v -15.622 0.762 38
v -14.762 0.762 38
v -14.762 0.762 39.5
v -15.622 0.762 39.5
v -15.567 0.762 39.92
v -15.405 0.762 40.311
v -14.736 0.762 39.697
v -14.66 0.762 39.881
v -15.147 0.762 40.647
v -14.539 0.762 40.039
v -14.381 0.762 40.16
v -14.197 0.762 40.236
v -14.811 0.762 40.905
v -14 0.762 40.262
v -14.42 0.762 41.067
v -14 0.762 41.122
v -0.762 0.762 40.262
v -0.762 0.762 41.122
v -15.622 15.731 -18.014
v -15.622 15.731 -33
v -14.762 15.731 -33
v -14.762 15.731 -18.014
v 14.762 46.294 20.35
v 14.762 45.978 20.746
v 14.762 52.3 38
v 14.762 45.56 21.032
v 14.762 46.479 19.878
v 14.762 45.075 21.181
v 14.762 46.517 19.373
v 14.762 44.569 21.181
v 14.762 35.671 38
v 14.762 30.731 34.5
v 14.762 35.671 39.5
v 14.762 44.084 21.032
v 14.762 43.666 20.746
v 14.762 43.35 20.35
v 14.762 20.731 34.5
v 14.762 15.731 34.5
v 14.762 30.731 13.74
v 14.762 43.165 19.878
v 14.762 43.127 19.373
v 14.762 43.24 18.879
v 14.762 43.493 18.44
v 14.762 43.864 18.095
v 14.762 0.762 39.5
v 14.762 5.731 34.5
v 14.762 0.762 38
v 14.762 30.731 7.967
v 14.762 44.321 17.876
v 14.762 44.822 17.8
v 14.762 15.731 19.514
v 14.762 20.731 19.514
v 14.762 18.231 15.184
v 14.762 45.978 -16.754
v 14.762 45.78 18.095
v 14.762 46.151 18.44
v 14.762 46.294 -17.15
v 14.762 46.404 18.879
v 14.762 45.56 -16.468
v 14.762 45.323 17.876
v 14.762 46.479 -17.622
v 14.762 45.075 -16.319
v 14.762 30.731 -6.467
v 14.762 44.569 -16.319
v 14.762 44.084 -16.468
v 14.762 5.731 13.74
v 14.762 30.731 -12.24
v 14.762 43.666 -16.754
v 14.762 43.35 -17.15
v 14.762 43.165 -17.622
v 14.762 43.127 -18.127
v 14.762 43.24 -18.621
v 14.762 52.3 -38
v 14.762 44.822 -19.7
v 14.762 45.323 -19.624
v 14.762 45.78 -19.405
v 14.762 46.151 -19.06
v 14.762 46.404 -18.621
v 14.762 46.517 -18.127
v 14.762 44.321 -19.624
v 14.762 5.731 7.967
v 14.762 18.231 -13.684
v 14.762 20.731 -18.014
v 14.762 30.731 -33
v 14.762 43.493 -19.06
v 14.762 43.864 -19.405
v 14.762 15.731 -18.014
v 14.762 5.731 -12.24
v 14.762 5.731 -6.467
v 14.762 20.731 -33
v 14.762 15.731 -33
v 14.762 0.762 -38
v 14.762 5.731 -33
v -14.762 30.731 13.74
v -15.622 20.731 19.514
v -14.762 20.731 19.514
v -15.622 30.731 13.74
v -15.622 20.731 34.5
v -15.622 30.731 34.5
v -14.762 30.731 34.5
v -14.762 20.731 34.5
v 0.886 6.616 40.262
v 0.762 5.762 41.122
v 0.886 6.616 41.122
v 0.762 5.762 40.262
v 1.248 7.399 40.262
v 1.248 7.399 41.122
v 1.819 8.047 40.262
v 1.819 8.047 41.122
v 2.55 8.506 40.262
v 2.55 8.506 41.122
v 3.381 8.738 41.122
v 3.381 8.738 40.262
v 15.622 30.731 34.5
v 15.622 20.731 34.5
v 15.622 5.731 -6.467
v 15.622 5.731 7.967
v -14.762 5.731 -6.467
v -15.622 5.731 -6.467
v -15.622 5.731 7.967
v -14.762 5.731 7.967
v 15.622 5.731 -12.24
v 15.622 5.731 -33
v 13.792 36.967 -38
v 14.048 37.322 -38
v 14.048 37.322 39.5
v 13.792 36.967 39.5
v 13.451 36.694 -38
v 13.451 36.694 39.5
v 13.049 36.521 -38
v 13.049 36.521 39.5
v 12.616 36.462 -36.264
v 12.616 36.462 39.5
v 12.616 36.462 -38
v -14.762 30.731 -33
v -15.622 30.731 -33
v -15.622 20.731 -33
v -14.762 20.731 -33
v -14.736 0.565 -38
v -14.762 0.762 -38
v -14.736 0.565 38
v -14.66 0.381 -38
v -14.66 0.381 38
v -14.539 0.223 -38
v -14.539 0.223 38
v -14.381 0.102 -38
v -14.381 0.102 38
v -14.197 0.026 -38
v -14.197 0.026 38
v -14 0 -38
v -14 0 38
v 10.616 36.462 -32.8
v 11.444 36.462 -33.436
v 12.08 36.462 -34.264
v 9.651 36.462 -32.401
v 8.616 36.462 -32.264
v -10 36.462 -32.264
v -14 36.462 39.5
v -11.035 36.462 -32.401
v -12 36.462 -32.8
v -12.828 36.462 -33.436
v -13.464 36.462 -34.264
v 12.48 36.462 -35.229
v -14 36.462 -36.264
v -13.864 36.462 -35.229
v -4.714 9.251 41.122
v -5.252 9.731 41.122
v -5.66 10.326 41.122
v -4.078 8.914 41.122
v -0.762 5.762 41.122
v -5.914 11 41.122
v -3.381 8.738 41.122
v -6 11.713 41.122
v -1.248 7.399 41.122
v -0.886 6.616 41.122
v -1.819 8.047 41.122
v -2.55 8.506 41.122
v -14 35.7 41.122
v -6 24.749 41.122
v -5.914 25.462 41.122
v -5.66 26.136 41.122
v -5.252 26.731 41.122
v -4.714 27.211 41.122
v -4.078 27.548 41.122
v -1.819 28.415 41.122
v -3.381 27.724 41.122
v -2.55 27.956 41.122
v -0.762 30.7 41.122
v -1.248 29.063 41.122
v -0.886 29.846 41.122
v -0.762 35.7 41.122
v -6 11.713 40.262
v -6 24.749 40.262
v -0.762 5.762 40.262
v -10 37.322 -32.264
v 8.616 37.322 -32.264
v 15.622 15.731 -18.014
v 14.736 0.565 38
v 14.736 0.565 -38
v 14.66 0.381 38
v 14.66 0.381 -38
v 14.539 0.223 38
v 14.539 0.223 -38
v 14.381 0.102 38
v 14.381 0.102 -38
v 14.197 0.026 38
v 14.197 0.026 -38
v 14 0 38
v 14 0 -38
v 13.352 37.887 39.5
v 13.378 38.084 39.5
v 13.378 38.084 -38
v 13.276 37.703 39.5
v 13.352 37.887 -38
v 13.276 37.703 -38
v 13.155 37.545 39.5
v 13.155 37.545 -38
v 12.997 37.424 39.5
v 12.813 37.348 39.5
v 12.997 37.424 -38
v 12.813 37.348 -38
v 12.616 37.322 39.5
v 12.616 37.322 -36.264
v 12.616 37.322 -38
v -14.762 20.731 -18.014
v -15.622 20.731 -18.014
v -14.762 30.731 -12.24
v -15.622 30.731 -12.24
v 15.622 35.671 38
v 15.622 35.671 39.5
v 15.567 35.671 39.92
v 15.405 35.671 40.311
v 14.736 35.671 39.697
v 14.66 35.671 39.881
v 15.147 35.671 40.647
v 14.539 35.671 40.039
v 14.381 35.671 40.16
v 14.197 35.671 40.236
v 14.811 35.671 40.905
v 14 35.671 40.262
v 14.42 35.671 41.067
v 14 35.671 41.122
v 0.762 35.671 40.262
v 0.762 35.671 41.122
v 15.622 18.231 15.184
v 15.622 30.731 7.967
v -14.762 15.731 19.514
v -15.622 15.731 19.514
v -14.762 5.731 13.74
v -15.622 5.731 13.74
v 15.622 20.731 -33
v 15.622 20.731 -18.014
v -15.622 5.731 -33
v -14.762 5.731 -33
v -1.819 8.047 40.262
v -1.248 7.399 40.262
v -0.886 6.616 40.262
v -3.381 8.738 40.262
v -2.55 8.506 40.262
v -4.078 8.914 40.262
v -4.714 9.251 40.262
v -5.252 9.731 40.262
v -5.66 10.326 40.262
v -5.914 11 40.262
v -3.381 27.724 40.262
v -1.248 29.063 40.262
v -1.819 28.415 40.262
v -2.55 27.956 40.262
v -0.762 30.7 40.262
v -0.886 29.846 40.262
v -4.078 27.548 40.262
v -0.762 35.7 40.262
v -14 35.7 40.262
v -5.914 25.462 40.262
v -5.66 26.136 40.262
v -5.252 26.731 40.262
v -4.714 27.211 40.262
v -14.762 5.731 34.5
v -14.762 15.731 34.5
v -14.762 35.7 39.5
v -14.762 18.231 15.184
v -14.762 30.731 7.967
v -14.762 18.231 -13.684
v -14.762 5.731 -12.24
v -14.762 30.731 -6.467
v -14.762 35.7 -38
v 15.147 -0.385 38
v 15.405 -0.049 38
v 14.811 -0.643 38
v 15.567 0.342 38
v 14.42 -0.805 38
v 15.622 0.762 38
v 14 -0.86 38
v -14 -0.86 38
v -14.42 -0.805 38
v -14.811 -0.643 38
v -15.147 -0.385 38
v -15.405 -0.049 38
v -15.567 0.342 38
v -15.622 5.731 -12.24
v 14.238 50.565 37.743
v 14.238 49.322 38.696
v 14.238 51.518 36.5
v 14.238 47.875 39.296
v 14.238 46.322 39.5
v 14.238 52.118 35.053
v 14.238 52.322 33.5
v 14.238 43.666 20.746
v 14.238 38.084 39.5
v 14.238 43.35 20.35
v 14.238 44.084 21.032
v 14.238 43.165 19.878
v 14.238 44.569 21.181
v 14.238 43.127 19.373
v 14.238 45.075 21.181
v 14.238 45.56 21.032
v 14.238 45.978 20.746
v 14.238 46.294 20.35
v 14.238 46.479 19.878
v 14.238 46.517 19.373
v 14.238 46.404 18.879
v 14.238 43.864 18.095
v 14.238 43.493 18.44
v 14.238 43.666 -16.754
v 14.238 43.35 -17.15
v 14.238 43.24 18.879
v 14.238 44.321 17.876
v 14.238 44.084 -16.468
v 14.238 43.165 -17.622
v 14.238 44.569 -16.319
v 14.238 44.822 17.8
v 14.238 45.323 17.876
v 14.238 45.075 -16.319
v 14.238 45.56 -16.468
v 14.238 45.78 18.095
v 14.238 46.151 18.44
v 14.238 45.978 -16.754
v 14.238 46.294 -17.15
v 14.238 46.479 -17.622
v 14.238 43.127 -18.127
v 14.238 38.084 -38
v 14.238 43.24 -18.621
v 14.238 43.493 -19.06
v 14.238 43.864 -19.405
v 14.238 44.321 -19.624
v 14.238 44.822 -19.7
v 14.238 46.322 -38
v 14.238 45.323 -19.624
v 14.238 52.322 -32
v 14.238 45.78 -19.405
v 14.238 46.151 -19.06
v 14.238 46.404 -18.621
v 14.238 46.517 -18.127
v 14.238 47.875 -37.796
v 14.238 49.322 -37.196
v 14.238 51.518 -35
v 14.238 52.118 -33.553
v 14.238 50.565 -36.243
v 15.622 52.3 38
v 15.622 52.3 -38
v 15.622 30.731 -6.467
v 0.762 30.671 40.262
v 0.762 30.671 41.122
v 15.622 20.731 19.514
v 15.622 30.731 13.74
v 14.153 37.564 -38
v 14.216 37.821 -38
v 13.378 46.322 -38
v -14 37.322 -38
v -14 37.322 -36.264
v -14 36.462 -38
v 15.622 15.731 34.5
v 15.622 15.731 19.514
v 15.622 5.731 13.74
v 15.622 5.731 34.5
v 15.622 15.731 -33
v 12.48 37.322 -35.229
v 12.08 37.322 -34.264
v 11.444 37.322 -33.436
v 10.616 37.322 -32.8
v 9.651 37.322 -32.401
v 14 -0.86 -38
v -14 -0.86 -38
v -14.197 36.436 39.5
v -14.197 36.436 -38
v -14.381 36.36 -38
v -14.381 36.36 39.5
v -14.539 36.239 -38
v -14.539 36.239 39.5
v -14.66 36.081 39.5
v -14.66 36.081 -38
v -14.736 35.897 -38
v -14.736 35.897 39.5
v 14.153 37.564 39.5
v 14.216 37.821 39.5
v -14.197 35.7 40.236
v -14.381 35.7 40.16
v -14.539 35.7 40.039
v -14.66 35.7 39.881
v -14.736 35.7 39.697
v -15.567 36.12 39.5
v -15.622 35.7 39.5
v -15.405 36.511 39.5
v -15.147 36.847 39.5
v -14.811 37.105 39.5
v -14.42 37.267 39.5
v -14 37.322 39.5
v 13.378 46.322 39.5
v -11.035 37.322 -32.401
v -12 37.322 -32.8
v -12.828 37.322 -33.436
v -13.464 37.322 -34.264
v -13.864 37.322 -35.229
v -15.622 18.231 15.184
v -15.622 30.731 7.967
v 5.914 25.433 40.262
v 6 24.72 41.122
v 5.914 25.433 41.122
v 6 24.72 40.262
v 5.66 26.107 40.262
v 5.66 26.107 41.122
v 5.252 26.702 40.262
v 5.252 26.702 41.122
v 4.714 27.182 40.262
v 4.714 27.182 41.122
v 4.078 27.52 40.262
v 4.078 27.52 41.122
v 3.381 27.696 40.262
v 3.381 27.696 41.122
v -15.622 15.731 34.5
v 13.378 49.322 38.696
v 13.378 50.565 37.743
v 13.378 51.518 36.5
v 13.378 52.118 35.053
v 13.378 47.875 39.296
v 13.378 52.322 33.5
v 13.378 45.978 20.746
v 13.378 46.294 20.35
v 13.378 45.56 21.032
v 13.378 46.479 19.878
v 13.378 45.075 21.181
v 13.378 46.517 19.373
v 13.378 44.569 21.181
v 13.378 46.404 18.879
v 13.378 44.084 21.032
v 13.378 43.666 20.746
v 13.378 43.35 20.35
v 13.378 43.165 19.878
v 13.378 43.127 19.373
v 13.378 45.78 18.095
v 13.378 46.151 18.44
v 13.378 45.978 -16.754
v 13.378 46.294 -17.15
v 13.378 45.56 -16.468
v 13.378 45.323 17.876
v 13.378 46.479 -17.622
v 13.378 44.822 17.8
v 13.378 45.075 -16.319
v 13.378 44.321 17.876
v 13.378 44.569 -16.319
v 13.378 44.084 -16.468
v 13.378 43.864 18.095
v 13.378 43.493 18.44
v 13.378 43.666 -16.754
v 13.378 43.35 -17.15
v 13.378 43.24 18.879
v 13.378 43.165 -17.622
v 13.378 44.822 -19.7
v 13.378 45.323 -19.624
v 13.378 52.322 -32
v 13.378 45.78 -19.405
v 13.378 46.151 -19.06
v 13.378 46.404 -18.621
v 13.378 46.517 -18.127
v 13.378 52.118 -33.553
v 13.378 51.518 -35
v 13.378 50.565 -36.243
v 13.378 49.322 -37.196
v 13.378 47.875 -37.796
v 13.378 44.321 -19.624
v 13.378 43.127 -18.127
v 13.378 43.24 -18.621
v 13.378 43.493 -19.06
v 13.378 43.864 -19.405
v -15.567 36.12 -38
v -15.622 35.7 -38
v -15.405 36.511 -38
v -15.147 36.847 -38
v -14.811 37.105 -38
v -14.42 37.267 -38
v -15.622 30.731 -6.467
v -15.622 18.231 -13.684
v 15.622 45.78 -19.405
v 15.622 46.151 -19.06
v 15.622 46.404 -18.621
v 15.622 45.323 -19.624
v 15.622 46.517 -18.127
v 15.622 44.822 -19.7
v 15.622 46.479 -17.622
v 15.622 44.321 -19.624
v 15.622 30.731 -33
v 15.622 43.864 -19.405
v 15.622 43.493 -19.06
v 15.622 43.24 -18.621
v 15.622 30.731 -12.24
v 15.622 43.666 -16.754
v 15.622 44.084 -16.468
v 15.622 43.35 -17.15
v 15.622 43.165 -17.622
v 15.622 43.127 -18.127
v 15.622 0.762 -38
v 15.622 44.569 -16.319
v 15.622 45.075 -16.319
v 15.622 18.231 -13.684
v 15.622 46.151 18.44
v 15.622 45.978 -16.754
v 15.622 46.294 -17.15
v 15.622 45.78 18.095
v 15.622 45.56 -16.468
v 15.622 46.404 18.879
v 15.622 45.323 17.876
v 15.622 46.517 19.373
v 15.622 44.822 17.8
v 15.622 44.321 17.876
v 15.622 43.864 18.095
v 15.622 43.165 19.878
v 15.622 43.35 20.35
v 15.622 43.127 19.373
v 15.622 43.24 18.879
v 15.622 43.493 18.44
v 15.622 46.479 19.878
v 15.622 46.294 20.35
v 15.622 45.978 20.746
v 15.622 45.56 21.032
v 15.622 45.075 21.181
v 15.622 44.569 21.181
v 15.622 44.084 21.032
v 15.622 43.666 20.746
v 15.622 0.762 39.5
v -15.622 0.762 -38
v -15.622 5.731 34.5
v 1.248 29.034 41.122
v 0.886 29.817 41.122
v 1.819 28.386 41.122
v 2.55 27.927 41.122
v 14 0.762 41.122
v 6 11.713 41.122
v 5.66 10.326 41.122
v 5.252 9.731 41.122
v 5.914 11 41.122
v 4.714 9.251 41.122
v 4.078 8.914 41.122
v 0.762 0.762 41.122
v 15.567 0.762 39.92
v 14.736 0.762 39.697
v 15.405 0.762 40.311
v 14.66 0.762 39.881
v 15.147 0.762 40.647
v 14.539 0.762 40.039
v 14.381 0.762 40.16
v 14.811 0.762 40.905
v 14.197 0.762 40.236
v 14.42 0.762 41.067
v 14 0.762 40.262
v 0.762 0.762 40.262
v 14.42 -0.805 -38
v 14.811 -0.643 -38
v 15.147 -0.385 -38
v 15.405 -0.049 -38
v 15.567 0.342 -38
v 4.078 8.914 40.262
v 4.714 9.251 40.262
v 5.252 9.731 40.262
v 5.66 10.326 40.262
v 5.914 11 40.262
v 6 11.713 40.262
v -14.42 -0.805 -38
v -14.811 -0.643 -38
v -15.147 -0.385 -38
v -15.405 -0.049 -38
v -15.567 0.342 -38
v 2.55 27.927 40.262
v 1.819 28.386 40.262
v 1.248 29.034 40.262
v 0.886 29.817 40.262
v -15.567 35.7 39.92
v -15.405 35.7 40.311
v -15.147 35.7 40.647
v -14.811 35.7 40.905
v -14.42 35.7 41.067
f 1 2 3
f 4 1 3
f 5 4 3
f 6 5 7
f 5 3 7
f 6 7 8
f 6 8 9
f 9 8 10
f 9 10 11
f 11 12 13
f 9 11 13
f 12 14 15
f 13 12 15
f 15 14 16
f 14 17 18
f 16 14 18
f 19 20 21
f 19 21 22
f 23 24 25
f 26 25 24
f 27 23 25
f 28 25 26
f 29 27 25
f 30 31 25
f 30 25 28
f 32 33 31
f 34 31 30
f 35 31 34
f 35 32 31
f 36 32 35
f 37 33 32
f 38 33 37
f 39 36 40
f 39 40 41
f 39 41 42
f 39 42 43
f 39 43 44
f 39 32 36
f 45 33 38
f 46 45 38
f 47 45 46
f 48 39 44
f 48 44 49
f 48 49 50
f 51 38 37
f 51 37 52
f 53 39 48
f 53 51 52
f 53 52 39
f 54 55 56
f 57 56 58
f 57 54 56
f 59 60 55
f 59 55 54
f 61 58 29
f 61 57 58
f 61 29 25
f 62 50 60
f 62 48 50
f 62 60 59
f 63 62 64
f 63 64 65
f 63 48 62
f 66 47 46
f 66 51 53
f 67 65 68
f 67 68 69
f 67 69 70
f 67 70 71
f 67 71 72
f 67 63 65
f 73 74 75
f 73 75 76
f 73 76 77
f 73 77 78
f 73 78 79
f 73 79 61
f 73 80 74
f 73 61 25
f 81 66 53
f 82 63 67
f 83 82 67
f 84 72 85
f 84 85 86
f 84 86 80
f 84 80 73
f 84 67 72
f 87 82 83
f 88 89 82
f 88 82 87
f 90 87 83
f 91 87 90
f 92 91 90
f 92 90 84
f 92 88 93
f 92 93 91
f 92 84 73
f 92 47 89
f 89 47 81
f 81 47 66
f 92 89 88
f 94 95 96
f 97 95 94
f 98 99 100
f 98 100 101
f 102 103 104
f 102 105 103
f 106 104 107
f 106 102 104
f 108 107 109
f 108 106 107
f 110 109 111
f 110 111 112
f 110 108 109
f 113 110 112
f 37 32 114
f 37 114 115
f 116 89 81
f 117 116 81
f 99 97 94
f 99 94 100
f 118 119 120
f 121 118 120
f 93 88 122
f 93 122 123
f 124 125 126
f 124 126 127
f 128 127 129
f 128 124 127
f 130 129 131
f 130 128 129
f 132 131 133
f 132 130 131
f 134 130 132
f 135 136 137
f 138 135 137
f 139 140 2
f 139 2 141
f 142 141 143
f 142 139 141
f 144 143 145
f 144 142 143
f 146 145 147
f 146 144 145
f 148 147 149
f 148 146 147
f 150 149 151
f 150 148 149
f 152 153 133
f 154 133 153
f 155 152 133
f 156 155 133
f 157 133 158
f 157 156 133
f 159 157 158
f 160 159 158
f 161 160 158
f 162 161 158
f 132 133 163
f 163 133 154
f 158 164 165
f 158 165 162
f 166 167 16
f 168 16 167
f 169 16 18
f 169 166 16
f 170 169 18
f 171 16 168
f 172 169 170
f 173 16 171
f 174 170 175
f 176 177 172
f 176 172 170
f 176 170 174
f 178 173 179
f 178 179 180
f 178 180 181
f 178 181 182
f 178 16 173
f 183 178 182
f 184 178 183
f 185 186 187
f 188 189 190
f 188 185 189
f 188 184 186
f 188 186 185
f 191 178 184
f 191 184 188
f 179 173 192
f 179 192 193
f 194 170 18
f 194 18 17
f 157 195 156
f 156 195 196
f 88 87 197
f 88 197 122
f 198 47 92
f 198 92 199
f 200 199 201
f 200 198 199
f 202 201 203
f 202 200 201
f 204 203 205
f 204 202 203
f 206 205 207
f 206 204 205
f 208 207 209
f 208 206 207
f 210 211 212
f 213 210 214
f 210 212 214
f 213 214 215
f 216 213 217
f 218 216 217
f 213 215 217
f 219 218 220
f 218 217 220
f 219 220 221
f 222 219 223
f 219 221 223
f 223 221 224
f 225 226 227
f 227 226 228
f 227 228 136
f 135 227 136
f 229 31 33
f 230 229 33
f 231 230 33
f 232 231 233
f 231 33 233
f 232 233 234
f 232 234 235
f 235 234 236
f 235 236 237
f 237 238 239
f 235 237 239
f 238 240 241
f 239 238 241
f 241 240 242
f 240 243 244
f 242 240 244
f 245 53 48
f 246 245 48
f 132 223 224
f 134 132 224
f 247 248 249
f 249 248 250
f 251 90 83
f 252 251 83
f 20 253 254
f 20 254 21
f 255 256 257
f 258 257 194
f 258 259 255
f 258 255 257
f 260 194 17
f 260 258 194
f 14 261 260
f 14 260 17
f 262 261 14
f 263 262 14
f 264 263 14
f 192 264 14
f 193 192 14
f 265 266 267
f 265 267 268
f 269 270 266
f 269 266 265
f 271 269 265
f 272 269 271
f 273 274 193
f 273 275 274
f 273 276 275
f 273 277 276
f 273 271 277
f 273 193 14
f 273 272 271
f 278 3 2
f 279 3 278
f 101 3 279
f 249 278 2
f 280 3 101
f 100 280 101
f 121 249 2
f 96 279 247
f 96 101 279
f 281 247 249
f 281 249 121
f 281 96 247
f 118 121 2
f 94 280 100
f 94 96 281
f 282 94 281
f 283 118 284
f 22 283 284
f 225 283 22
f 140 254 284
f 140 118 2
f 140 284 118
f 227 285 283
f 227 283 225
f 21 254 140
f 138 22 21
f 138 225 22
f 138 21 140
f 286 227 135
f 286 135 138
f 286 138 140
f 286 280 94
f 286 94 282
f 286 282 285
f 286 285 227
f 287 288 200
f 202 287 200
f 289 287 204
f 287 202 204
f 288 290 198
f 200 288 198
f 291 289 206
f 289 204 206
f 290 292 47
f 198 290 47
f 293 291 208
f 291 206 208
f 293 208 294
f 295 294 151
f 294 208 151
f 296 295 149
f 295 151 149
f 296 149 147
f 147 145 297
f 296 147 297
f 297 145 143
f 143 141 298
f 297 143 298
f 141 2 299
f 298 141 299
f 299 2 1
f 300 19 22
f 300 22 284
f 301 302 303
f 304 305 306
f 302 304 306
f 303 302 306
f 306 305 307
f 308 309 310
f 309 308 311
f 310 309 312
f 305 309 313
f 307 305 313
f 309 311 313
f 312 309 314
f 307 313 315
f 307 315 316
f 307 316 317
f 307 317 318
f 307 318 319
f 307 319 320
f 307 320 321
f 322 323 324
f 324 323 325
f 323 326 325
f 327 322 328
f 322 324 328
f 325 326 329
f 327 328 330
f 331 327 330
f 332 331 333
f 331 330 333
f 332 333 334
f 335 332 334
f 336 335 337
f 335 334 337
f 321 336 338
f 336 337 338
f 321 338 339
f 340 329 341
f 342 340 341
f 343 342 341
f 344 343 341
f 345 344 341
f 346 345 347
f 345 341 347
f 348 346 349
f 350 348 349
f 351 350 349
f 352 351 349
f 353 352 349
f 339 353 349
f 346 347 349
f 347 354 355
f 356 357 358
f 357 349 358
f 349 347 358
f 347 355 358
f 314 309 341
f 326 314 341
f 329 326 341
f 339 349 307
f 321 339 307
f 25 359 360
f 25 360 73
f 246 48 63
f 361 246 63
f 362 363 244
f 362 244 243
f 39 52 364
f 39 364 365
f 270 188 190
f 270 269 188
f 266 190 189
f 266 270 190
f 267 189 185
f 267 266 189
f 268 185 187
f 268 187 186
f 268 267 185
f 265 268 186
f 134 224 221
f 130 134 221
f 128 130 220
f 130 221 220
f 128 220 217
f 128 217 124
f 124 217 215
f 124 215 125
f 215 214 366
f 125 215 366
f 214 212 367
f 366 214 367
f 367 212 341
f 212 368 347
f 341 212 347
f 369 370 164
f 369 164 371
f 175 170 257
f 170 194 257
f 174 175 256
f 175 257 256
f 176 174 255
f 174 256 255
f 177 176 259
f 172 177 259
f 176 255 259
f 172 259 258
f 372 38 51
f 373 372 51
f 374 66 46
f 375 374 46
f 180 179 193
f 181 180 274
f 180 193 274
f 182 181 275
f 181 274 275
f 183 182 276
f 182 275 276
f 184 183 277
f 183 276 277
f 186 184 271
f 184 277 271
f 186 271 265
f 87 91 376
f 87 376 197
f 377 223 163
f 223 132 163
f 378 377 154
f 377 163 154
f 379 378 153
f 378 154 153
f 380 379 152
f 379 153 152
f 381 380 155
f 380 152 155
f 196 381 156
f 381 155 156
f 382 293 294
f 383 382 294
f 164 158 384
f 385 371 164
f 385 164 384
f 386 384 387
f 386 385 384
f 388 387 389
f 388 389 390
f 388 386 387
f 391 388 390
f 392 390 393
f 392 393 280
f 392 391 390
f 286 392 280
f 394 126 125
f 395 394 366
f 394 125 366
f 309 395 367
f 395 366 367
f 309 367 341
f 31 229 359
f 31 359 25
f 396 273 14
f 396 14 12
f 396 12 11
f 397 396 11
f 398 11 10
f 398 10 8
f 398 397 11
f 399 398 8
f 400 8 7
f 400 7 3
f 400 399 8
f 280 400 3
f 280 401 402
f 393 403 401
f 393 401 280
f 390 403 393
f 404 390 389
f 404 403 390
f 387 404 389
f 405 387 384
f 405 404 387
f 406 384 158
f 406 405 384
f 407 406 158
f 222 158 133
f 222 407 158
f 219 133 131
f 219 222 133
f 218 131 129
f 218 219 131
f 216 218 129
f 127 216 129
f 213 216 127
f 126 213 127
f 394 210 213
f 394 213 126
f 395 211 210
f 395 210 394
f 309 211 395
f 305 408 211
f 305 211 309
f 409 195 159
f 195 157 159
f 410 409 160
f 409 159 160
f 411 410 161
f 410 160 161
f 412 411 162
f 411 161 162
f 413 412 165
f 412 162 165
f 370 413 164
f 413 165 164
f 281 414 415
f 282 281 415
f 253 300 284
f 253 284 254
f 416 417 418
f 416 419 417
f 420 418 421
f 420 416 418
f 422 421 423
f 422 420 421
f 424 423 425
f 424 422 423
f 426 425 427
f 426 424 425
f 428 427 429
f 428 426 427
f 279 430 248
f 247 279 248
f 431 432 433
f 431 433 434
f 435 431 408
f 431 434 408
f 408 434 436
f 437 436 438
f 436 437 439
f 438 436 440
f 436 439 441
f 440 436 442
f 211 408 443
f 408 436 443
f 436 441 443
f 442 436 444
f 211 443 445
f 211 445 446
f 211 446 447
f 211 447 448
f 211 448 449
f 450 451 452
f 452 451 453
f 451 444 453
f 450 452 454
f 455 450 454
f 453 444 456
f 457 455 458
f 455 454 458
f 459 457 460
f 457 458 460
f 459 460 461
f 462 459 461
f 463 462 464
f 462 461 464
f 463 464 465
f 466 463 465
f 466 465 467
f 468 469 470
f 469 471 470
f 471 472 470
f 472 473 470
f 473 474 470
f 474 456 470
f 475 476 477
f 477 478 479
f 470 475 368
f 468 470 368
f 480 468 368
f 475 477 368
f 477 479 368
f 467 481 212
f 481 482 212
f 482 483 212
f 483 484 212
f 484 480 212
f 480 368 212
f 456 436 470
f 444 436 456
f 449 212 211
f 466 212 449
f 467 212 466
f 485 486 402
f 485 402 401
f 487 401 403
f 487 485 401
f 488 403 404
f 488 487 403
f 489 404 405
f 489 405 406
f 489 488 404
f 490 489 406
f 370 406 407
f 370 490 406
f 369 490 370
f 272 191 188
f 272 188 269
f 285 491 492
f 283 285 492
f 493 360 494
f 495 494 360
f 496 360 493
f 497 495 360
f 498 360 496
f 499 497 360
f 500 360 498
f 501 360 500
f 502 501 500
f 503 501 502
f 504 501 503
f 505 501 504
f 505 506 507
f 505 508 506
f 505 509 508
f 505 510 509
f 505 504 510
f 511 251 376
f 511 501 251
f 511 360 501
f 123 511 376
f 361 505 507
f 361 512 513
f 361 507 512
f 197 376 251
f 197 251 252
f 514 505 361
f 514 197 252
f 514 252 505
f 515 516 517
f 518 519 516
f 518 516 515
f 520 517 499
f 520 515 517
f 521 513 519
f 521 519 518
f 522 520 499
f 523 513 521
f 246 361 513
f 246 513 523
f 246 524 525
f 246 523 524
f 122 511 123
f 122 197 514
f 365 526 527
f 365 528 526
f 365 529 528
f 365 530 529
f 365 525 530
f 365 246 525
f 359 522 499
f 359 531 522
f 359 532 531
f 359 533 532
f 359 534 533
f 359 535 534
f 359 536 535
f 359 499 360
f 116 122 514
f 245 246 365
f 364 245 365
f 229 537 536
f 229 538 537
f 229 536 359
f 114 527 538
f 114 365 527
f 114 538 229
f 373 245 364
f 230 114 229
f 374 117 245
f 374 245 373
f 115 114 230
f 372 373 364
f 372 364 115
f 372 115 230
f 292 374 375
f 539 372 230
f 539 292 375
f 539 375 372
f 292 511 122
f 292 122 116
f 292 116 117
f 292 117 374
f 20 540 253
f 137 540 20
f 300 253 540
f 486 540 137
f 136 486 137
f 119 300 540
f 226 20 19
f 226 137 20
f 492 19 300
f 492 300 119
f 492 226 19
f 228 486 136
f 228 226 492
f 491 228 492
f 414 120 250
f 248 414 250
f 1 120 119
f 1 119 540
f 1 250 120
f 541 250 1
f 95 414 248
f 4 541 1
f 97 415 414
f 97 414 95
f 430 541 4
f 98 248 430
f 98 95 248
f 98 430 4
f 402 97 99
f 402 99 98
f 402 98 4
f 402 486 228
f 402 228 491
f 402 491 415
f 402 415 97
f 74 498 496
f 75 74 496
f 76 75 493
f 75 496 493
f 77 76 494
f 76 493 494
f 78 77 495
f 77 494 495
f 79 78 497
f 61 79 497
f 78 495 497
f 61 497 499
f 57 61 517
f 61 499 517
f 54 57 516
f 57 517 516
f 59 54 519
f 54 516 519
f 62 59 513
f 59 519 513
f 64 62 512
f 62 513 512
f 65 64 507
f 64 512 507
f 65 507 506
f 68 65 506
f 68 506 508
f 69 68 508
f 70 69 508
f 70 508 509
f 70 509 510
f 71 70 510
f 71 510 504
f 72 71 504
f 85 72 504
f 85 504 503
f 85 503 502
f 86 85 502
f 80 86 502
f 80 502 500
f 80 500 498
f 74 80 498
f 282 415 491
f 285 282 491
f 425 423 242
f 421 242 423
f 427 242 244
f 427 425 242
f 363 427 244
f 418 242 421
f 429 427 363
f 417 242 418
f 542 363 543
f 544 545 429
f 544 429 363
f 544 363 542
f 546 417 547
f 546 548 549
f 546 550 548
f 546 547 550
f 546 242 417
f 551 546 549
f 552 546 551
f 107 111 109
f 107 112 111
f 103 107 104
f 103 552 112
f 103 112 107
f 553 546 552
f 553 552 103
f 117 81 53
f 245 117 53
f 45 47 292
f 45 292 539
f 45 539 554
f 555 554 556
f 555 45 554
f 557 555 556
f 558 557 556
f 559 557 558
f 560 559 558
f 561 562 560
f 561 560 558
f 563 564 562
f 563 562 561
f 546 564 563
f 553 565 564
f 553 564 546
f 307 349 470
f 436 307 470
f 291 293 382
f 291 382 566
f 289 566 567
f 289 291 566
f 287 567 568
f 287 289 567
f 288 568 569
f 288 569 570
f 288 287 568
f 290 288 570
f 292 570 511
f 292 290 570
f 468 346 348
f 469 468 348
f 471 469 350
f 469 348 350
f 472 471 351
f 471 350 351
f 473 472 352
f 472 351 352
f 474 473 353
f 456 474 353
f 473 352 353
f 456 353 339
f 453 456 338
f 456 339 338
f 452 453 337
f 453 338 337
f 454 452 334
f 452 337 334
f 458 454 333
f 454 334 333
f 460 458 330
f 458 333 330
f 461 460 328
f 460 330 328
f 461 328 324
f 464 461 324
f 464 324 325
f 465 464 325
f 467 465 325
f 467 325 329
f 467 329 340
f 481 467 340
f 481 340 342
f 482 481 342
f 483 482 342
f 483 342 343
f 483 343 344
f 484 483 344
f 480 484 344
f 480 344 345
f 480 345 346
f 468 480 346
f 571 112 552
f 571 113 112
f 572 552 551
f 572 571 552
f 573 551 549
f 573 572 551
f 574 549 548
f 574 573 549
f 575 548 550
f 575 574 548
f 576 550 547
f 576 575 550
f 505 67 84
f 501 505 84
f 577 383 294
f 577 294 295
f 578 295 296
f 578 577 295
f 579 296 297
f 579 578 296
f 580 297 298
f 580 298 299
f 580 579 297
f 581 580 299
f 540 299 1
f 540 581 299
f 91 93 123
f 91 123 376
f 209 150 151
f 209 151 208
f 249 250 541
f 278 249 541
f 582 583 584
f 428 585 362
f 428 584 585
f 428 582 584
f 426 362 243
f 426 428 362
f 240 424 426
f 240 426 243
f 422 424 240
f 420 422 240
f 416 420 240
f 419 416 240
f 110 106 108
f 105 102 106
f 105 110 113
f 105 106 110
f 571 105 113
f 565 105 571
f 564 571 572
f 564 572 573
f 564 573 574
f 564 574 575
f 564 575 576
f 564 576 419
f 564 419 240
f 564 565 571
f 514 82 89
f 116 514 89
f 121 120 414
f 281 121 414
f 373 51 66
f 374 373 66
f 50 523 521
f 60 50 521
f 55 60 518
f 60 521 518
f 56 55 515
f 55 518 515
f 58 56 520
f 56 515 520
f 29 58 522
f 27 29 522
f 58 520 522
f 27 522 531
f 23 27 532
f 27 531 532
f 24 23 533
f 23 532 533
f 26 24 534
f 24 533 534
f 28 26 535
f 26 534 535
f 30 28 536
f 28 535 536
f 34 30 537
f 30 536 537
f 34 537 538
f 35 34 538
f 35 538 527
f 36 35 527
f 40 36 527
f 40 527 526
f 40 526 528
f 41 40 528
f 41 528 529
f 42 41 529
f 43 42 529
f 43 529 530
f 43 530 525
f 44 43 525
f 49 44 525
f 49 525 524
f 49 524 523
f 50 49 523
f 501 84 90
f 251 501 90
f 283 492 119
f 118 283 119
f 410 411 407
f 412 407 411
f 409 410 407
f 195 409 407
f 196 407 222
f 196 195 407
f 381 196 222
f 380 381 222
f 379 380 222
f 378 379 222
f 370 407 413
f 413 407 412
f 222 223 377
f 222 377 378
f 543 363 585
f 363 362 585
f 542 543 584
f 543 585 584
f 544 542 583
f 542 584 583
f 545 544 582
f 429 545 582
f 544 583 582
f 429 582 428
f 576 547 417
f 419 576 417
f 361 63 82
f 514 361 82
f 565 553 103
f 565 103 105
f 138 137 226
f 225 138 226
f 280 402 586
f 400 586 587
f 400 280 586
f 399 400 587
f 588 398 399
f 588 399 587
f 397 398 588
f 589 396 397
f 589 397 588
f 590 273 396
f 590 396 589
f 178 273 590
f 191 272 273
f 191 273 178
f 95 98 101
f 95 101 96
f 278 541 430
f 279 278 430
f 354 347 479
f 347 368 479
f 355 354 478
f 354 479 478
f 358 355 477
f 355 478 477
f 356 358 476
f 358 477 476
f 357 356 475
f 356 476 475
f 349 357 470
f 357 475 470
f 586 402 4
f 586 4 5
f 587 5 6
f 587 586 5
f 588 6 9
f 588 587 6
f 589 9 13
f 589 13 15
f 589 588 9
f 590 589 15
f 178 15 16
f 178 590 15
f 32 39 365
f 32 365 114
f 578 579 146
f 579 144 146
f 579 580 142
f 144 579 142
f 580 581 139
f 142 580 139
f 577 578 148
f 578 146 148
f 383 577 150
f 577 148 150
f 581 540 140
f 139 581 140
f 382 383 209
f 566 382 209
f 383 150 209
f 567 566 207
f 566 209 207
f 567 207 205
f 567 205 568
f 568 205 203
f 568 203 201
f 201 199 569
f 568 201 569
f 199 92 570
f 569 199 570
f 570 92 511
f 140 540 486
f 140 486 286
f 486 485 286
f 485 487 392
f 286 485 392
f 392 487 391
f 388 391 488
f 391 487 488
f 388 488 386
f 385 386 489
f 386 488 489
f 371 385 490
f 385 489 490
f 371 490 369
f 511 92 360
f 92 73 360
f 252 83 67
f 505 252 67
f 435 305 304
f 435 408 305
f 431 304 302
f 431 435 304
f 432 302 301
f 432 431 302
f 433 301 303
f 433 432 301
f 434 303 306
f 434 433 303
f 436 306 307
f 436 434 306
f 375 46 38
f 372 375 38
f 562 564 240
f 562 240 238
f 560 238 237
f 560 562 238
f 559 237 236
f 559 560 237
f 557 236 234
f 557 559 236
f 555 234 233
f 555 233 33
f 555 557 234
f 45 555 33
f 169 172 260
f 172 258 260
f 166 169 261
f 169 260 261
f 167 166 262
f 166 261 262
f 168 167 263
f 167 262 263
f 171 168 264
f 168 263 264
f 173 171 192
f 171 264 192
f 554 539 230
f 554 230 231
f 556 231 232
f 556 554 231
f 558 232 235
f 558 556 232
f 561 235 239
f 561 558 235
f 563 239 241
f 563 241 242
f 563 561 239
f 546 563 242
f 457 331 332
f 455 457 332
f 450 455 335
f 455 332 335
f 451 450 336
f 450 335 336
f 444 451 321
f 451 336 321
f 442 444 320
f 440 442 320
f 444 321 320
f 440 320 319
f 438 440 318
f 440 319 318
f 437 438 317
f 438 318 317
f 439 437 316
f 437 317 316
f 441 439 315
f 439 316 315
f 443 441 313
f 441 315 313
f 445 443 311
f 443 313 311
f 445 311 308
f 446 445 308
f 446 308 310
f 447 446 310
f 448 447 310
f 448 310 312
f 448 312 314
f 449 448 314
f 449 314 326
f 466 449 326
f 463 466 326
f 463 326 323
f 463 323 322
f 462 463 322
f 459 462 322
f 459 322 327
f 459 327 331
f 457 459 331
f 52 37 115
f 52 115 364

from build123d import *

# Parameters (mm, degrees)
SKETCH1_W                = 24.5
SKETCH1_H                = 76
BASE_FLANGE1_DEPTH       = 0.86
EDGE_FLANGE1_DEPTH       = 76
EDGE_FLANGE4_DEPTH       = 76
EDGE_FLANGE5_DEPTH       = 34.909250773
EDGE_FLANGE6_DEPTH       = 34.938
EDGE_FLANGE7_DEPTH       = 77.5
SKETCH40_W               = 5.238
SKETCH40_H               = 18.938
CUT_EXTRUDE1_DEPTH       = 10
SKETCH41_W               = 5.238
SKETCH41_H               = 18.909250773
CUT_EXTRUDE2_DEPTH       = 10
FILLET1_R                = 3
FILLET2_R                = 3
EDGE_FLANGE9_START       = -38
EDGE_FLANGE9_DEPTH       = 77.5
EDGE_FLANGE9_2_DEPTH     = 77.5
M3_CLEARANCE_HOLE2_D     = 3.4
M3_CLEARANCE_HOLE2_DEPTH = 28.71
M3_CLEARANCE_HOLE2_TIP   = 1.021463052
FILLET4_R                = 6
SKETCH51_W               = 26.616
SKETCH51_H               = 5.735679753
CUT_EXTRUDE4_DEPTH       = 10
FILLET5_R                = 4
HEX_PATTERN_DEPTH        = 74.517332053


# Read off the part's stored shape, not the designer's step: Edge-Flange9
# Sheet-metal steps are written as plain solids
with BuildPart() as part:
    # Sketch1 → Base-Flange1 (new body)
    with BuildSketch(Plane(origin=(0, 0, 0), x_dir=(1, 0, 0), z_dir=(0, 1, 0))):
        Rectangle(SKETCH1_W, SKETCH1_H)
    extrude(amount=-BASE_FLANGE1_DEPTH)

    # Edge-Flange1 section (across the edge) → Edge-Flange1 (add)
    with BuildSketch(Plane(origin=(14.762, 0, 38), x_dir=(-1, 0, 0), z_dir=(0, 0, -1))):
        with BuildLine():
            Line((-0.86, 0.762), (-0.86, 52.3))
            Line((-0.86, 52.3), (0, 52.3))
            Line((0, 52.3), (0, 0.762))
            ThreePointArc((0, 0.762), (0.223184633, 0.223184633), (0.762, 0))
            Line((0.762, 0), (2.512, 0))
            Line((2.512, 0), (2.512, -0.86))
            Line((2.512, -0.86), (0.762, -0.86))
            ThreePointArc((0.762, -0.86), (-0.384927199, -0.384927199), (-0.86, 0.762))
        make_face()
    extrude(amount=EDGE_FLANGE1_DEPTH)

    # Edge-Flange4 section (across the edge) → Edge-Flange4 (add)
    with BuildSketch(Plane(origin=(-14.762, 0, -38), x_dir=(1, 0, 0), z_dir=(0, 0, 1))):
        with BuildLine():
            Line((-0.86, 0.762), (-0.86, 35.7))
            Line((-0.86, 35.7), (0, 35.7))
            Line((0, 35.7), (0, 0.762))
            ThreePointArc((0, 0.762), (0.223184633, 0.223184633), (0.762, 0))
            Line((0.762, 0), (2.512, 0))
            Line((2.512, 0), (2.512, -0.86))
            Line((2.512, -0.86), (0.762, -0.86))
            ThreePointArc((0.762, -0.86), (-0.384927199, -0.384927199), (-0.86, 0.762))
        make_face()
    extrude(amount=EDGE_FLANGE4_DEPTH)

    # Edge-Flange5 section (across the edge) → Edge-Flange5 (add)
    with BuildSketch(Plane(origin=(14.762, 0.762, 40.262), x_dir=(0, 0, -1), z_dir=(0, 1, 0))):
        with BuildLine():
            Line((-0.86, 0.762), (-0.86, 14))
            Line((-0.86, 14), (0, 14))
            Line((0, 14), (0, 0.762))
            ThreePointArc((0, 0.762), (0.223184633, 0.223184633), (0.762, 0))
            Line((0.762, 0), (2.262, 0))
            Line((2.262, 0), (2.262, -0.86))
            Line((2.262, -0.86), (0.762, -0.86))
            ThreePointArc((0.762, -0.86), (-0.384927199, -0.384927199), (-0.86, 0.762))
        make_face()
    extrude(amount=EDGE_FLANGE5_DEPTH)

    # Edge-Flange6 section (across the edge) → Edge-Flange6 (add)
    with BuildSketch(Plane(origin=(-14.762, 35.7, 40.262), x_dir=(0, 0, -1), z_dir=(0, -1, 0))):
        with BuildLine():
            Line((-0.86, 0.762), (-0.86, 14))
            Line((-0.86, 14), (0, 14))
            Line((0, 14), (0, 0.762))
            ThreePointArc((0, 0.762), (0.223184633, 0.223184633), (0.762, 0))
            Line((0.762, 0), (2.262, 0))
            Line((2.262, 0), (2.262, -0.86))
            Line((2.262, -0.86), (0.762, -0.86))
            ThreePointArc((0.762, -0.86), (-0.384927199, -0.384927199), (-0.86, 0.762))
        make_face()
    extrude(amount=EDGE_FLANGE6_DEPTH)

    # Edge-Flange7 section (across the edge) → Edge-Flange7 (add)
    with BuildSketch(Plane(origin=(-14.762, 36.462, -38), x_dir=(0, -1, 0), z_dir=(0, 0, 1))):
        with BuildLine():
            Line((-0.86, 0.762), (-0.86, 29))
            Line((-0.86, 29), (0, 29))
            Line((0, 29), (0, 0.762))
            ThreePointArc((0, 0.762), (0.223184633, 0.223184633), (0.762, 0))
            Line((0.762, 0), (0.762, -0.86))
            ThreePointArc((0.762, -0.86), (-0.384927199, -0.384927199), (-0.86, 0.762))
        make_face()
    extrude(amount=EDGE_FLANGE7_DEPTH)

    # Sketch40 → Cut-Extrude1 (cut)
    with BuildSketch(Plane.XY.offset(41.122)):
        with Locations((-3.381, 18.231)):
            Rectangle(SKETCH40_W, SKETCH40_H)
    extrude(amount=-CUT_EXTRUDE1_DEPTH, mode=Mode.SUBTRACT)

    # Sketch41 → Cut-Extrude2 (cut)
    with BuildSketch(Plane.XY.offset(41.122)):
        with Locations((3.381, 18.216625386)):
            Rectangle(SKETCH41_W, SKETCH41_H)
    extrude(amount=-CUT_EXTRUDE2_DEPTH, mode=Mode.SUBTRACT)

    # Fillet1
    fillet1_edges = [part.edges().sort_by_distance(p)[0] for p in [
        (-0.762, 8.762, 40.692),
        (-0.762, 27.7, 40.692),
        (0.762, 8.762, 40.692),
        (0.762, 27.671250773, 40.692),
    ]]
    fillet(fillet1_edges, radius=FILLET1_R)

    # Fillet2
    fillet2_edges = [part.edges().sort_by_distance(p)[0] for p in [
        (-6, 8.762, 40.692),
        (6, 8.762, 40.692),
        (6, 27.671250773, 40.692),
        (-6, 27.7, 40.692),
    ]]
    fillet(fillet2_edges, radius=FILLET2_R)

    # Edge-Flange9 outline → Edge-Flange9 (cut)
    with BuildSketch(Plane.XY.offset(EDGE_FLANGE9_START)):
        with BuildLine():
            Line((14.238, 37.322), (14.047865915, 37.322))
            ThreePointArc((14.047865915, 37.322), (13.451140707, 36.693523823), (12.616, 36.462))
            Line((12.616, 36.462), (14.238, 36.462))
            Line((14.238, 36.462), (14.238, 37.322))
        make_face()
    extrude(amount=EDGE_FLANGE9_DEPTH, mode=Mode.SUBTRACT)

    # Edge-Flange9 2 outline → Edge-Flange9 2 (add)
    with BuildSketch(Plane.XY.offset(EDGE_FLANGE9_START)):
        with BuildLine():
            ThreePointArc((14.047865915, 37.322), (14.189748791, 37.691318523), (14.238, 38.084))
            Line((14.238, 38.084), (14.238, 52.322))
            Line((14.238, 52.322), (13.378, 52.322))
            Line((13.378, 52.322), (13.378, 38.084))
            ThreePointArc((13.378, 38.084), (13.154815367, 37.545184633), (12.616, 37.322))
            Line((12.616, 37.322), (14.047865915, 37.322))
        make_face()
    extrude(amount=EDGE_FLANGE9_2_DEPTH)

    # M3 Clearance Hole2
    with Locations(Plane.ZY.offset(-13.378)):
        with Locations((-18, 44.822), (19.5, 44.822)):
            Hole(M3_CLEARANCE_HOLE2_D / 2, depth=M3_CLEARANCE_HOLE2_DEPTH)
            with Locations((0, 0, -(M3_CLEARANCE_HOLE2_DEPTH + M3_CLEARANCE_HOLE2_TIP / 2))):  # 118° drill point
                Cone(0, M3_CLEARANCE_HOLE2_D / 2, M3_CLEARANCE_HOLE2_TIP, mode=Mode.SUBTRACT)

    # Fillet4
    fillet4_edges = [part.edges().sort_by_distance(p)[0] for p in [
        (13.808, 52.322, 39.5),
        (13.808, 52.322, -38),
    ]]
    fillet(fillet4_edges, radius=FILLET4_R)

    # Sketch51 → Cut-Extrude4 (cut)
    with BuildSketch(Plane(origin=(0, 37.322, 0), x_dir=(1, 0, 0), z_dir=(0, 1, 0))):
        with Locations((-0.692, 35.132160124)):
            Rectangle(SKETCH51_W, SKETCH51_H)
    extrude(amount=-CUT_EXTRUDE4_DEPTH, mode=Mode.SUBTRACT)

    # Fillet5
    fillet5_edges = [part.edges().sort_by_distance(p)[0] for p in [
        (-14, 36.892, -32.264320247),
        (12.616, 36.892, -32.264320247),
    ]]
    fillet(fillet5_edges, radius=FILLET5_R)

    # Sketch52 → Hex Pattern (cut, through all)
    with BuildSketch(Plane.ZY.offset(15.622)):
        Polygon((13.740381057, 30.731), (34.5, 30.731), (34.5, 20.731), (19.513883749, 20.731), align=None)
        Polygon((15.18375673, 18.231), (7.966878365, 30.731), (-6.466878365, 30.731), (-13.68375673, 18.231), (-6.466878365, 5.731), (7.966878365, 5.731), align=None)
        Polygon((-18.013883749, 20.731), (-12.240381057, 30.731), (-33, 30.731), (-33, 20.731), align=None)
        Polygon((-18.013883749, 15.731), (-12.240381057, 5.731), (-33, 5.731), (-33, 15.731), align=None)
        Polygon((19.513883749, 15.731), (13.740381057, 5.731), (34.5, 5.731), (34.5, 15.731), align=None)
    extrude(amount=-HEX_PATTERN_DEPTH, mode=Mode.SUBTRACT)


solid = part.part
